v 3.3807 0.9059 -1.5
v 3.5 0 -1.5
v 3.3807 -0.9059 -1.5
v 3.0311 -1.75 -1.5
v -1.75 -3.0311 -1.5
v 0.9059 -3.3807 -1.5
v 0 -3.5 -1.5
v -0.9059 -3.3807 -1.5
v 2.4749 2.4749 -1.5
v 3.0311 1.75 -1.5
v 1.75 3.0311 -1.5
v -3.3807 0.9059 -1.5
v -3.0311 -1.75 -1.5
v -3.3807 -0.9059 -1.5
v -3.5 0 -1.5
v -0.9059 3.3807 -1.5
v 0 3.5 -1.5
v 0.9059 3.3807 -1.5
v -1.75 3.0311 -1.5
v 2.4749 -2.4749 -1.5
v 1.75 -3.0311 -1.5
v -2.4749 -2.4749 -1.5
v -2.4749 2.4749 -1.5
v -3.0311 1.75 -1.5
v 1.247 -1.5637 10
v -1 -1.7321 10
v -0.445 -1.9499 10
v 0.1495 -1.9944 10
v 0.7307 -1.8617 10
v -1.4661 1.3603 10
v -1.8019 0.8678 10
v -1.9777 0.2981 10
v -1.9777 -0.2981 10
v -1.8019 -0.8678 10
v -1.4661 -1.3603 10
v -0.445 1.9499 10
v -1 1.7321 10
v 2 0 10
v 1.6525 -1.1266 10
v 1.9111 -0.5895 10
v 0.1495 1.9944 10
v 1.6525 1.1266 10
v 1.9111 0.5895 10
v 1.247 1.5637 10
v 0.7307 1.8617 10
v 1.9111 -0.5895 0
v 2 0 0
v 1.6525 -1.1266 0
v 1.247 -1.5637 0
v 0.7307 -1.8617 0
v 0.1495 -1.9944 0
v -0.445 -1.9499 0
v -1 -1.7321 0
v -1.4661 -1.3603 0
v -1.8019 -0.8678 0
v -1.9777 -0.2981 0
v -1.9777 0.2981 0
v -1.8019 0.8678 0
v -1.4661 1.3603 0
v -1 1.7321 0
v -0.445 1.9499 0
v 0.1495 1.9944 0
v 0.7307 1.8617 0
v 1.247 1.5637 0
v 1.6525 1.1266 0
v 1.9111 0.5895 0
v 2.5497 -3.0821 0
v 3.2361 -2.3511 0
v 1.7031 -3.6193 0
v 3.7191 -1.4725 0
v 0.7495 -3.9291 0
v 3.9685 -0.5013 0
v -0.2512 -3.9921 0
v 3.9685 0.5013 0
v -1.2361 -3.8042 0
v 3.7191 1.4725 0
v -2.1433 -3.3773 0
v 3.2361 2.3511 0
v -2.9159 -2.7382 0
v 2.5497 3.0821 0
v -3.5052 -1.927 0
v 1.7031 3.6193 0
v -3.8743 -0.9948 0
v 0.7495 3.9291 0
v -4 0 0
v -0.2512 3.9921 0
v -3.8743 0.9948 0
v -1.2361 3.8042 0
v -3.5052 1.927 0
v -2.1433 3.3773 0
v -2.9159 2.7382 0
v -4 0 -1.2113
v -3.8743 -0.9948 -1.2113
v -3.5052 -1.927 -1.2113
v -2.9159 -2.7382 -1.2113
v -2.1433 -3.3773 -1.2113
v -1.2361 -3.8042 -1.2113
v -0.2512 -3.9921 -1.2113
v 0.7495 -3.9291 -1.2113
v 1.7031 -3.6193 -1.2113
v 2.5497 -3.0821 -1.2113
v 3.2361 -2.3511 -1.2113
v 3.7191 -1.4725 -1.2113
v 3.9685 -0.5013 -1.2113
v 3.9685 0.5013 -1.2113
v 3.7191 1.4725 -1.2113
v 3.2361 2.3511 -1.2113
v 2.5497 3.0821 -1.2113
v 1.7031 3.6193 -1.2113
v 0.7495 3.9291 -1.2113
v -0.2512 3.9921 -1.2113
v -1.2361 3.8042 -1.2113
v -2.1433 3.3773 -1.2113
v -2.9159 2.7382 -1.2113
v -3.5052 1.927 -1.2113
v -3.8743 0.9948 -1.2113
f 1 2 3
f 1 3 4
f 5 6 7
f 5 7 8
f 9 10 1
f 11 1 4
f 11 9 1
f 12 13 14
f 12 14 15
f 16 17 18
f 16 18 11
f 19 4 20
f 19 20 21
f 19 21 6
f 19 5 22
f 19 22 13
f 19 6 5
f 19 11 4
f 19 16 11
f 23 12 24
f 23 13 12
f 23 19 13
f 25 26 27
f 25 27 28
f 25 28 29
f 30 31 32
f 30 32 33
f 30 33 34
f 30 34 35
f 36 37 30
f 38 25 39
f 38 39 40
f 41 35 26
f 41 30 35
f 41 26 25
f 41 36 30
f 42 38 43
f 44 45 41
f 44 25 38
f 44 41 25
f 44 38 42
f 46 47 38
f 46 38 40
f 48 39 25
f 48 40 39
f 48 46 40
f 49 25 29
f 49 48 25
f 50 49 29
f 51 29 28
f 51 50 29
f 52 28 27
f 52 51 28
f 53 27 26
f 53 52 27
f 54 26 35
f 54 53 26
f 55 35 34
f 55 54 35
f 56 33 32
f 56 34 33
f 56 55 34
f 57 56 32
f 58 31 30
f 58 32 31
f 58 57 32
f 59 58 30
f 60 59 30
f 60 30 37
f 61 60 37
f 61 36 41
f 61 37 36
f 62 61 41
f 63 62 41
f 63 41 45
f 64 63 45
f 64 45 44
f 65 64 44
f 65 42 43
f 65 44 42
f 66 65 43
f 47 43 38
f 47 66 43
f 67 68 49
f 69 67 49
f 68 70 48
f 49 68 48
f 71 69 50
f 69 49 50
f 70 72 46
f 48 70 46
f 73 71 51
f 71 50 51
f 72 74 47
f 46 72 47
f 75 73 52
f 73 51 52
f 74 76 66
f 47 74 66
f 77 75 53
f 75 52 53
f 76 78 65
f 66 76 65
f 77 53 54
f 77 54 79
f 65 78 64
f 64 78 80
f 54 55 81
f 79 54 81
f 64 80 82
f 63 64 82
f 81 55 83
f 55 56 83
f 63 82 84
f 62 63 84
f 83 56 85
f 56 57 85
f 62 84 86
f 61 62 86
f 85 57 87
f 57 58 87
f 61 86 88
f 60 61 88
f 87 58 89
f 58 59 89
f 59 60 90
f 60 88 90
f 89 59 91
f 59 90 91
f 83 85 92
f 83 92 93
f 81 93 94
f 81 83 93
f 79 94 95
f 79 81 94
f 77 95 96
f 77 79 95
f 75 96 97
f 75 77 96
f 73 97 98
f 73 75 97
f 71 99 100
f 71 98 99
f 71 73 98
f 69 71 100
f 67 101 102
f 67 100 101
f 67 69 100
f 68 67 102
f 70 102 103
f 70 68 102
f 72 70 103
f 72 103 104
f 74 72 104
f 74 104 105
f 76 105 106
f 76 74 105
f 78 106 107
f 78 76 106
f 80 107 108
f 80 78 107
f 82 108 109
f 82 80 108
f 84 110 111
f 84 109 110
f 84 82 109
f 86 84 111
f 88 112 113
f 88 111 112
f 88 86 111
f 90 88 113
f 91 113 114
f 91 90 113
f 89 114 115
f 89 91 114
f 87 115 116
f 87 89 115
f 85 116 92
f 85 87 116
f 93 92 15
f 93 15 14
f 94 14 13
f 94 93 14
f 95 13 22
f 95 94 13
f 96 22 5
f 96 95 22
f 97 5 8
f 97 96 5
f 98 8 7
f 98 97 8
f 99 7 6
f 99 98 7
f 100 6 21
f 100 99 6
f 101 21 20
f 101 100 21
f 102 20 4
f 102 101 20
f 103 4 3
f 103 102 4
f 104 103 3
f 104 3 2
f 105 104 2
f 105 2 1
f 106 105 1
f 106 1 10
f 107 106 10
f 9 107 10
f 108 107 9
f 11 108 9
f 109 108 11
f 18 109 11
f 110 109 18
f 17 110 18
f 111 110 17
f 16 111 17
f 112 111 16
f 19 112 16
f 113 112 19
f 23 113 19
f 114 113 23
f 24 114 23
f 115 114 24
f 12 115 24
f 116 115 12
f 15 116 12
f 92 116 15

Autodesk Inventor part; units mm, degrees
ref_plane "YZ Plane" through (0, 0, 0) normal (1, 0, 0) x (0, 1, 0)
ref_plane "XZ Plane" through (0, 0, 0) normal (0, 1, 0) x (-1, 0, 0)
ref_plane "XY Plane" through (0, 0, 0) normal (0, 0, 1) x (1, 0, 0)
sketch "スケッチ1" plane through (0, 0, 0) normal (0, 0, 1) x (1, 0, 0)
  circle A0 centre (0, 0) radius 2
  dimension "d0" = 4
extrude "押し出し1" add sketch "スケッチ1" along normal blind 10
sketch "スケッチ2" plane through (0, 0, 0) normal (0, 0, -1) x (-1, 0, 0)
  circle A0 centre (0, 0) radius 4
  dimension "d3" = 8
extrude "押し出し2" add sketch "スケッチ2" along normal blind 1.5
thread "ねじ1" size "M4x0.7" class "6g" standard "ANSI Metric M Profile" full length
chamfer "面取り1" distance 0.5 angle 30 1 edges at (4, 0, -1.5) measured on face at (-0.7574, 1.0973, -1.5)
properties part number "ネジローヘッドm4,10" material "鋼、高強度、低合金"
